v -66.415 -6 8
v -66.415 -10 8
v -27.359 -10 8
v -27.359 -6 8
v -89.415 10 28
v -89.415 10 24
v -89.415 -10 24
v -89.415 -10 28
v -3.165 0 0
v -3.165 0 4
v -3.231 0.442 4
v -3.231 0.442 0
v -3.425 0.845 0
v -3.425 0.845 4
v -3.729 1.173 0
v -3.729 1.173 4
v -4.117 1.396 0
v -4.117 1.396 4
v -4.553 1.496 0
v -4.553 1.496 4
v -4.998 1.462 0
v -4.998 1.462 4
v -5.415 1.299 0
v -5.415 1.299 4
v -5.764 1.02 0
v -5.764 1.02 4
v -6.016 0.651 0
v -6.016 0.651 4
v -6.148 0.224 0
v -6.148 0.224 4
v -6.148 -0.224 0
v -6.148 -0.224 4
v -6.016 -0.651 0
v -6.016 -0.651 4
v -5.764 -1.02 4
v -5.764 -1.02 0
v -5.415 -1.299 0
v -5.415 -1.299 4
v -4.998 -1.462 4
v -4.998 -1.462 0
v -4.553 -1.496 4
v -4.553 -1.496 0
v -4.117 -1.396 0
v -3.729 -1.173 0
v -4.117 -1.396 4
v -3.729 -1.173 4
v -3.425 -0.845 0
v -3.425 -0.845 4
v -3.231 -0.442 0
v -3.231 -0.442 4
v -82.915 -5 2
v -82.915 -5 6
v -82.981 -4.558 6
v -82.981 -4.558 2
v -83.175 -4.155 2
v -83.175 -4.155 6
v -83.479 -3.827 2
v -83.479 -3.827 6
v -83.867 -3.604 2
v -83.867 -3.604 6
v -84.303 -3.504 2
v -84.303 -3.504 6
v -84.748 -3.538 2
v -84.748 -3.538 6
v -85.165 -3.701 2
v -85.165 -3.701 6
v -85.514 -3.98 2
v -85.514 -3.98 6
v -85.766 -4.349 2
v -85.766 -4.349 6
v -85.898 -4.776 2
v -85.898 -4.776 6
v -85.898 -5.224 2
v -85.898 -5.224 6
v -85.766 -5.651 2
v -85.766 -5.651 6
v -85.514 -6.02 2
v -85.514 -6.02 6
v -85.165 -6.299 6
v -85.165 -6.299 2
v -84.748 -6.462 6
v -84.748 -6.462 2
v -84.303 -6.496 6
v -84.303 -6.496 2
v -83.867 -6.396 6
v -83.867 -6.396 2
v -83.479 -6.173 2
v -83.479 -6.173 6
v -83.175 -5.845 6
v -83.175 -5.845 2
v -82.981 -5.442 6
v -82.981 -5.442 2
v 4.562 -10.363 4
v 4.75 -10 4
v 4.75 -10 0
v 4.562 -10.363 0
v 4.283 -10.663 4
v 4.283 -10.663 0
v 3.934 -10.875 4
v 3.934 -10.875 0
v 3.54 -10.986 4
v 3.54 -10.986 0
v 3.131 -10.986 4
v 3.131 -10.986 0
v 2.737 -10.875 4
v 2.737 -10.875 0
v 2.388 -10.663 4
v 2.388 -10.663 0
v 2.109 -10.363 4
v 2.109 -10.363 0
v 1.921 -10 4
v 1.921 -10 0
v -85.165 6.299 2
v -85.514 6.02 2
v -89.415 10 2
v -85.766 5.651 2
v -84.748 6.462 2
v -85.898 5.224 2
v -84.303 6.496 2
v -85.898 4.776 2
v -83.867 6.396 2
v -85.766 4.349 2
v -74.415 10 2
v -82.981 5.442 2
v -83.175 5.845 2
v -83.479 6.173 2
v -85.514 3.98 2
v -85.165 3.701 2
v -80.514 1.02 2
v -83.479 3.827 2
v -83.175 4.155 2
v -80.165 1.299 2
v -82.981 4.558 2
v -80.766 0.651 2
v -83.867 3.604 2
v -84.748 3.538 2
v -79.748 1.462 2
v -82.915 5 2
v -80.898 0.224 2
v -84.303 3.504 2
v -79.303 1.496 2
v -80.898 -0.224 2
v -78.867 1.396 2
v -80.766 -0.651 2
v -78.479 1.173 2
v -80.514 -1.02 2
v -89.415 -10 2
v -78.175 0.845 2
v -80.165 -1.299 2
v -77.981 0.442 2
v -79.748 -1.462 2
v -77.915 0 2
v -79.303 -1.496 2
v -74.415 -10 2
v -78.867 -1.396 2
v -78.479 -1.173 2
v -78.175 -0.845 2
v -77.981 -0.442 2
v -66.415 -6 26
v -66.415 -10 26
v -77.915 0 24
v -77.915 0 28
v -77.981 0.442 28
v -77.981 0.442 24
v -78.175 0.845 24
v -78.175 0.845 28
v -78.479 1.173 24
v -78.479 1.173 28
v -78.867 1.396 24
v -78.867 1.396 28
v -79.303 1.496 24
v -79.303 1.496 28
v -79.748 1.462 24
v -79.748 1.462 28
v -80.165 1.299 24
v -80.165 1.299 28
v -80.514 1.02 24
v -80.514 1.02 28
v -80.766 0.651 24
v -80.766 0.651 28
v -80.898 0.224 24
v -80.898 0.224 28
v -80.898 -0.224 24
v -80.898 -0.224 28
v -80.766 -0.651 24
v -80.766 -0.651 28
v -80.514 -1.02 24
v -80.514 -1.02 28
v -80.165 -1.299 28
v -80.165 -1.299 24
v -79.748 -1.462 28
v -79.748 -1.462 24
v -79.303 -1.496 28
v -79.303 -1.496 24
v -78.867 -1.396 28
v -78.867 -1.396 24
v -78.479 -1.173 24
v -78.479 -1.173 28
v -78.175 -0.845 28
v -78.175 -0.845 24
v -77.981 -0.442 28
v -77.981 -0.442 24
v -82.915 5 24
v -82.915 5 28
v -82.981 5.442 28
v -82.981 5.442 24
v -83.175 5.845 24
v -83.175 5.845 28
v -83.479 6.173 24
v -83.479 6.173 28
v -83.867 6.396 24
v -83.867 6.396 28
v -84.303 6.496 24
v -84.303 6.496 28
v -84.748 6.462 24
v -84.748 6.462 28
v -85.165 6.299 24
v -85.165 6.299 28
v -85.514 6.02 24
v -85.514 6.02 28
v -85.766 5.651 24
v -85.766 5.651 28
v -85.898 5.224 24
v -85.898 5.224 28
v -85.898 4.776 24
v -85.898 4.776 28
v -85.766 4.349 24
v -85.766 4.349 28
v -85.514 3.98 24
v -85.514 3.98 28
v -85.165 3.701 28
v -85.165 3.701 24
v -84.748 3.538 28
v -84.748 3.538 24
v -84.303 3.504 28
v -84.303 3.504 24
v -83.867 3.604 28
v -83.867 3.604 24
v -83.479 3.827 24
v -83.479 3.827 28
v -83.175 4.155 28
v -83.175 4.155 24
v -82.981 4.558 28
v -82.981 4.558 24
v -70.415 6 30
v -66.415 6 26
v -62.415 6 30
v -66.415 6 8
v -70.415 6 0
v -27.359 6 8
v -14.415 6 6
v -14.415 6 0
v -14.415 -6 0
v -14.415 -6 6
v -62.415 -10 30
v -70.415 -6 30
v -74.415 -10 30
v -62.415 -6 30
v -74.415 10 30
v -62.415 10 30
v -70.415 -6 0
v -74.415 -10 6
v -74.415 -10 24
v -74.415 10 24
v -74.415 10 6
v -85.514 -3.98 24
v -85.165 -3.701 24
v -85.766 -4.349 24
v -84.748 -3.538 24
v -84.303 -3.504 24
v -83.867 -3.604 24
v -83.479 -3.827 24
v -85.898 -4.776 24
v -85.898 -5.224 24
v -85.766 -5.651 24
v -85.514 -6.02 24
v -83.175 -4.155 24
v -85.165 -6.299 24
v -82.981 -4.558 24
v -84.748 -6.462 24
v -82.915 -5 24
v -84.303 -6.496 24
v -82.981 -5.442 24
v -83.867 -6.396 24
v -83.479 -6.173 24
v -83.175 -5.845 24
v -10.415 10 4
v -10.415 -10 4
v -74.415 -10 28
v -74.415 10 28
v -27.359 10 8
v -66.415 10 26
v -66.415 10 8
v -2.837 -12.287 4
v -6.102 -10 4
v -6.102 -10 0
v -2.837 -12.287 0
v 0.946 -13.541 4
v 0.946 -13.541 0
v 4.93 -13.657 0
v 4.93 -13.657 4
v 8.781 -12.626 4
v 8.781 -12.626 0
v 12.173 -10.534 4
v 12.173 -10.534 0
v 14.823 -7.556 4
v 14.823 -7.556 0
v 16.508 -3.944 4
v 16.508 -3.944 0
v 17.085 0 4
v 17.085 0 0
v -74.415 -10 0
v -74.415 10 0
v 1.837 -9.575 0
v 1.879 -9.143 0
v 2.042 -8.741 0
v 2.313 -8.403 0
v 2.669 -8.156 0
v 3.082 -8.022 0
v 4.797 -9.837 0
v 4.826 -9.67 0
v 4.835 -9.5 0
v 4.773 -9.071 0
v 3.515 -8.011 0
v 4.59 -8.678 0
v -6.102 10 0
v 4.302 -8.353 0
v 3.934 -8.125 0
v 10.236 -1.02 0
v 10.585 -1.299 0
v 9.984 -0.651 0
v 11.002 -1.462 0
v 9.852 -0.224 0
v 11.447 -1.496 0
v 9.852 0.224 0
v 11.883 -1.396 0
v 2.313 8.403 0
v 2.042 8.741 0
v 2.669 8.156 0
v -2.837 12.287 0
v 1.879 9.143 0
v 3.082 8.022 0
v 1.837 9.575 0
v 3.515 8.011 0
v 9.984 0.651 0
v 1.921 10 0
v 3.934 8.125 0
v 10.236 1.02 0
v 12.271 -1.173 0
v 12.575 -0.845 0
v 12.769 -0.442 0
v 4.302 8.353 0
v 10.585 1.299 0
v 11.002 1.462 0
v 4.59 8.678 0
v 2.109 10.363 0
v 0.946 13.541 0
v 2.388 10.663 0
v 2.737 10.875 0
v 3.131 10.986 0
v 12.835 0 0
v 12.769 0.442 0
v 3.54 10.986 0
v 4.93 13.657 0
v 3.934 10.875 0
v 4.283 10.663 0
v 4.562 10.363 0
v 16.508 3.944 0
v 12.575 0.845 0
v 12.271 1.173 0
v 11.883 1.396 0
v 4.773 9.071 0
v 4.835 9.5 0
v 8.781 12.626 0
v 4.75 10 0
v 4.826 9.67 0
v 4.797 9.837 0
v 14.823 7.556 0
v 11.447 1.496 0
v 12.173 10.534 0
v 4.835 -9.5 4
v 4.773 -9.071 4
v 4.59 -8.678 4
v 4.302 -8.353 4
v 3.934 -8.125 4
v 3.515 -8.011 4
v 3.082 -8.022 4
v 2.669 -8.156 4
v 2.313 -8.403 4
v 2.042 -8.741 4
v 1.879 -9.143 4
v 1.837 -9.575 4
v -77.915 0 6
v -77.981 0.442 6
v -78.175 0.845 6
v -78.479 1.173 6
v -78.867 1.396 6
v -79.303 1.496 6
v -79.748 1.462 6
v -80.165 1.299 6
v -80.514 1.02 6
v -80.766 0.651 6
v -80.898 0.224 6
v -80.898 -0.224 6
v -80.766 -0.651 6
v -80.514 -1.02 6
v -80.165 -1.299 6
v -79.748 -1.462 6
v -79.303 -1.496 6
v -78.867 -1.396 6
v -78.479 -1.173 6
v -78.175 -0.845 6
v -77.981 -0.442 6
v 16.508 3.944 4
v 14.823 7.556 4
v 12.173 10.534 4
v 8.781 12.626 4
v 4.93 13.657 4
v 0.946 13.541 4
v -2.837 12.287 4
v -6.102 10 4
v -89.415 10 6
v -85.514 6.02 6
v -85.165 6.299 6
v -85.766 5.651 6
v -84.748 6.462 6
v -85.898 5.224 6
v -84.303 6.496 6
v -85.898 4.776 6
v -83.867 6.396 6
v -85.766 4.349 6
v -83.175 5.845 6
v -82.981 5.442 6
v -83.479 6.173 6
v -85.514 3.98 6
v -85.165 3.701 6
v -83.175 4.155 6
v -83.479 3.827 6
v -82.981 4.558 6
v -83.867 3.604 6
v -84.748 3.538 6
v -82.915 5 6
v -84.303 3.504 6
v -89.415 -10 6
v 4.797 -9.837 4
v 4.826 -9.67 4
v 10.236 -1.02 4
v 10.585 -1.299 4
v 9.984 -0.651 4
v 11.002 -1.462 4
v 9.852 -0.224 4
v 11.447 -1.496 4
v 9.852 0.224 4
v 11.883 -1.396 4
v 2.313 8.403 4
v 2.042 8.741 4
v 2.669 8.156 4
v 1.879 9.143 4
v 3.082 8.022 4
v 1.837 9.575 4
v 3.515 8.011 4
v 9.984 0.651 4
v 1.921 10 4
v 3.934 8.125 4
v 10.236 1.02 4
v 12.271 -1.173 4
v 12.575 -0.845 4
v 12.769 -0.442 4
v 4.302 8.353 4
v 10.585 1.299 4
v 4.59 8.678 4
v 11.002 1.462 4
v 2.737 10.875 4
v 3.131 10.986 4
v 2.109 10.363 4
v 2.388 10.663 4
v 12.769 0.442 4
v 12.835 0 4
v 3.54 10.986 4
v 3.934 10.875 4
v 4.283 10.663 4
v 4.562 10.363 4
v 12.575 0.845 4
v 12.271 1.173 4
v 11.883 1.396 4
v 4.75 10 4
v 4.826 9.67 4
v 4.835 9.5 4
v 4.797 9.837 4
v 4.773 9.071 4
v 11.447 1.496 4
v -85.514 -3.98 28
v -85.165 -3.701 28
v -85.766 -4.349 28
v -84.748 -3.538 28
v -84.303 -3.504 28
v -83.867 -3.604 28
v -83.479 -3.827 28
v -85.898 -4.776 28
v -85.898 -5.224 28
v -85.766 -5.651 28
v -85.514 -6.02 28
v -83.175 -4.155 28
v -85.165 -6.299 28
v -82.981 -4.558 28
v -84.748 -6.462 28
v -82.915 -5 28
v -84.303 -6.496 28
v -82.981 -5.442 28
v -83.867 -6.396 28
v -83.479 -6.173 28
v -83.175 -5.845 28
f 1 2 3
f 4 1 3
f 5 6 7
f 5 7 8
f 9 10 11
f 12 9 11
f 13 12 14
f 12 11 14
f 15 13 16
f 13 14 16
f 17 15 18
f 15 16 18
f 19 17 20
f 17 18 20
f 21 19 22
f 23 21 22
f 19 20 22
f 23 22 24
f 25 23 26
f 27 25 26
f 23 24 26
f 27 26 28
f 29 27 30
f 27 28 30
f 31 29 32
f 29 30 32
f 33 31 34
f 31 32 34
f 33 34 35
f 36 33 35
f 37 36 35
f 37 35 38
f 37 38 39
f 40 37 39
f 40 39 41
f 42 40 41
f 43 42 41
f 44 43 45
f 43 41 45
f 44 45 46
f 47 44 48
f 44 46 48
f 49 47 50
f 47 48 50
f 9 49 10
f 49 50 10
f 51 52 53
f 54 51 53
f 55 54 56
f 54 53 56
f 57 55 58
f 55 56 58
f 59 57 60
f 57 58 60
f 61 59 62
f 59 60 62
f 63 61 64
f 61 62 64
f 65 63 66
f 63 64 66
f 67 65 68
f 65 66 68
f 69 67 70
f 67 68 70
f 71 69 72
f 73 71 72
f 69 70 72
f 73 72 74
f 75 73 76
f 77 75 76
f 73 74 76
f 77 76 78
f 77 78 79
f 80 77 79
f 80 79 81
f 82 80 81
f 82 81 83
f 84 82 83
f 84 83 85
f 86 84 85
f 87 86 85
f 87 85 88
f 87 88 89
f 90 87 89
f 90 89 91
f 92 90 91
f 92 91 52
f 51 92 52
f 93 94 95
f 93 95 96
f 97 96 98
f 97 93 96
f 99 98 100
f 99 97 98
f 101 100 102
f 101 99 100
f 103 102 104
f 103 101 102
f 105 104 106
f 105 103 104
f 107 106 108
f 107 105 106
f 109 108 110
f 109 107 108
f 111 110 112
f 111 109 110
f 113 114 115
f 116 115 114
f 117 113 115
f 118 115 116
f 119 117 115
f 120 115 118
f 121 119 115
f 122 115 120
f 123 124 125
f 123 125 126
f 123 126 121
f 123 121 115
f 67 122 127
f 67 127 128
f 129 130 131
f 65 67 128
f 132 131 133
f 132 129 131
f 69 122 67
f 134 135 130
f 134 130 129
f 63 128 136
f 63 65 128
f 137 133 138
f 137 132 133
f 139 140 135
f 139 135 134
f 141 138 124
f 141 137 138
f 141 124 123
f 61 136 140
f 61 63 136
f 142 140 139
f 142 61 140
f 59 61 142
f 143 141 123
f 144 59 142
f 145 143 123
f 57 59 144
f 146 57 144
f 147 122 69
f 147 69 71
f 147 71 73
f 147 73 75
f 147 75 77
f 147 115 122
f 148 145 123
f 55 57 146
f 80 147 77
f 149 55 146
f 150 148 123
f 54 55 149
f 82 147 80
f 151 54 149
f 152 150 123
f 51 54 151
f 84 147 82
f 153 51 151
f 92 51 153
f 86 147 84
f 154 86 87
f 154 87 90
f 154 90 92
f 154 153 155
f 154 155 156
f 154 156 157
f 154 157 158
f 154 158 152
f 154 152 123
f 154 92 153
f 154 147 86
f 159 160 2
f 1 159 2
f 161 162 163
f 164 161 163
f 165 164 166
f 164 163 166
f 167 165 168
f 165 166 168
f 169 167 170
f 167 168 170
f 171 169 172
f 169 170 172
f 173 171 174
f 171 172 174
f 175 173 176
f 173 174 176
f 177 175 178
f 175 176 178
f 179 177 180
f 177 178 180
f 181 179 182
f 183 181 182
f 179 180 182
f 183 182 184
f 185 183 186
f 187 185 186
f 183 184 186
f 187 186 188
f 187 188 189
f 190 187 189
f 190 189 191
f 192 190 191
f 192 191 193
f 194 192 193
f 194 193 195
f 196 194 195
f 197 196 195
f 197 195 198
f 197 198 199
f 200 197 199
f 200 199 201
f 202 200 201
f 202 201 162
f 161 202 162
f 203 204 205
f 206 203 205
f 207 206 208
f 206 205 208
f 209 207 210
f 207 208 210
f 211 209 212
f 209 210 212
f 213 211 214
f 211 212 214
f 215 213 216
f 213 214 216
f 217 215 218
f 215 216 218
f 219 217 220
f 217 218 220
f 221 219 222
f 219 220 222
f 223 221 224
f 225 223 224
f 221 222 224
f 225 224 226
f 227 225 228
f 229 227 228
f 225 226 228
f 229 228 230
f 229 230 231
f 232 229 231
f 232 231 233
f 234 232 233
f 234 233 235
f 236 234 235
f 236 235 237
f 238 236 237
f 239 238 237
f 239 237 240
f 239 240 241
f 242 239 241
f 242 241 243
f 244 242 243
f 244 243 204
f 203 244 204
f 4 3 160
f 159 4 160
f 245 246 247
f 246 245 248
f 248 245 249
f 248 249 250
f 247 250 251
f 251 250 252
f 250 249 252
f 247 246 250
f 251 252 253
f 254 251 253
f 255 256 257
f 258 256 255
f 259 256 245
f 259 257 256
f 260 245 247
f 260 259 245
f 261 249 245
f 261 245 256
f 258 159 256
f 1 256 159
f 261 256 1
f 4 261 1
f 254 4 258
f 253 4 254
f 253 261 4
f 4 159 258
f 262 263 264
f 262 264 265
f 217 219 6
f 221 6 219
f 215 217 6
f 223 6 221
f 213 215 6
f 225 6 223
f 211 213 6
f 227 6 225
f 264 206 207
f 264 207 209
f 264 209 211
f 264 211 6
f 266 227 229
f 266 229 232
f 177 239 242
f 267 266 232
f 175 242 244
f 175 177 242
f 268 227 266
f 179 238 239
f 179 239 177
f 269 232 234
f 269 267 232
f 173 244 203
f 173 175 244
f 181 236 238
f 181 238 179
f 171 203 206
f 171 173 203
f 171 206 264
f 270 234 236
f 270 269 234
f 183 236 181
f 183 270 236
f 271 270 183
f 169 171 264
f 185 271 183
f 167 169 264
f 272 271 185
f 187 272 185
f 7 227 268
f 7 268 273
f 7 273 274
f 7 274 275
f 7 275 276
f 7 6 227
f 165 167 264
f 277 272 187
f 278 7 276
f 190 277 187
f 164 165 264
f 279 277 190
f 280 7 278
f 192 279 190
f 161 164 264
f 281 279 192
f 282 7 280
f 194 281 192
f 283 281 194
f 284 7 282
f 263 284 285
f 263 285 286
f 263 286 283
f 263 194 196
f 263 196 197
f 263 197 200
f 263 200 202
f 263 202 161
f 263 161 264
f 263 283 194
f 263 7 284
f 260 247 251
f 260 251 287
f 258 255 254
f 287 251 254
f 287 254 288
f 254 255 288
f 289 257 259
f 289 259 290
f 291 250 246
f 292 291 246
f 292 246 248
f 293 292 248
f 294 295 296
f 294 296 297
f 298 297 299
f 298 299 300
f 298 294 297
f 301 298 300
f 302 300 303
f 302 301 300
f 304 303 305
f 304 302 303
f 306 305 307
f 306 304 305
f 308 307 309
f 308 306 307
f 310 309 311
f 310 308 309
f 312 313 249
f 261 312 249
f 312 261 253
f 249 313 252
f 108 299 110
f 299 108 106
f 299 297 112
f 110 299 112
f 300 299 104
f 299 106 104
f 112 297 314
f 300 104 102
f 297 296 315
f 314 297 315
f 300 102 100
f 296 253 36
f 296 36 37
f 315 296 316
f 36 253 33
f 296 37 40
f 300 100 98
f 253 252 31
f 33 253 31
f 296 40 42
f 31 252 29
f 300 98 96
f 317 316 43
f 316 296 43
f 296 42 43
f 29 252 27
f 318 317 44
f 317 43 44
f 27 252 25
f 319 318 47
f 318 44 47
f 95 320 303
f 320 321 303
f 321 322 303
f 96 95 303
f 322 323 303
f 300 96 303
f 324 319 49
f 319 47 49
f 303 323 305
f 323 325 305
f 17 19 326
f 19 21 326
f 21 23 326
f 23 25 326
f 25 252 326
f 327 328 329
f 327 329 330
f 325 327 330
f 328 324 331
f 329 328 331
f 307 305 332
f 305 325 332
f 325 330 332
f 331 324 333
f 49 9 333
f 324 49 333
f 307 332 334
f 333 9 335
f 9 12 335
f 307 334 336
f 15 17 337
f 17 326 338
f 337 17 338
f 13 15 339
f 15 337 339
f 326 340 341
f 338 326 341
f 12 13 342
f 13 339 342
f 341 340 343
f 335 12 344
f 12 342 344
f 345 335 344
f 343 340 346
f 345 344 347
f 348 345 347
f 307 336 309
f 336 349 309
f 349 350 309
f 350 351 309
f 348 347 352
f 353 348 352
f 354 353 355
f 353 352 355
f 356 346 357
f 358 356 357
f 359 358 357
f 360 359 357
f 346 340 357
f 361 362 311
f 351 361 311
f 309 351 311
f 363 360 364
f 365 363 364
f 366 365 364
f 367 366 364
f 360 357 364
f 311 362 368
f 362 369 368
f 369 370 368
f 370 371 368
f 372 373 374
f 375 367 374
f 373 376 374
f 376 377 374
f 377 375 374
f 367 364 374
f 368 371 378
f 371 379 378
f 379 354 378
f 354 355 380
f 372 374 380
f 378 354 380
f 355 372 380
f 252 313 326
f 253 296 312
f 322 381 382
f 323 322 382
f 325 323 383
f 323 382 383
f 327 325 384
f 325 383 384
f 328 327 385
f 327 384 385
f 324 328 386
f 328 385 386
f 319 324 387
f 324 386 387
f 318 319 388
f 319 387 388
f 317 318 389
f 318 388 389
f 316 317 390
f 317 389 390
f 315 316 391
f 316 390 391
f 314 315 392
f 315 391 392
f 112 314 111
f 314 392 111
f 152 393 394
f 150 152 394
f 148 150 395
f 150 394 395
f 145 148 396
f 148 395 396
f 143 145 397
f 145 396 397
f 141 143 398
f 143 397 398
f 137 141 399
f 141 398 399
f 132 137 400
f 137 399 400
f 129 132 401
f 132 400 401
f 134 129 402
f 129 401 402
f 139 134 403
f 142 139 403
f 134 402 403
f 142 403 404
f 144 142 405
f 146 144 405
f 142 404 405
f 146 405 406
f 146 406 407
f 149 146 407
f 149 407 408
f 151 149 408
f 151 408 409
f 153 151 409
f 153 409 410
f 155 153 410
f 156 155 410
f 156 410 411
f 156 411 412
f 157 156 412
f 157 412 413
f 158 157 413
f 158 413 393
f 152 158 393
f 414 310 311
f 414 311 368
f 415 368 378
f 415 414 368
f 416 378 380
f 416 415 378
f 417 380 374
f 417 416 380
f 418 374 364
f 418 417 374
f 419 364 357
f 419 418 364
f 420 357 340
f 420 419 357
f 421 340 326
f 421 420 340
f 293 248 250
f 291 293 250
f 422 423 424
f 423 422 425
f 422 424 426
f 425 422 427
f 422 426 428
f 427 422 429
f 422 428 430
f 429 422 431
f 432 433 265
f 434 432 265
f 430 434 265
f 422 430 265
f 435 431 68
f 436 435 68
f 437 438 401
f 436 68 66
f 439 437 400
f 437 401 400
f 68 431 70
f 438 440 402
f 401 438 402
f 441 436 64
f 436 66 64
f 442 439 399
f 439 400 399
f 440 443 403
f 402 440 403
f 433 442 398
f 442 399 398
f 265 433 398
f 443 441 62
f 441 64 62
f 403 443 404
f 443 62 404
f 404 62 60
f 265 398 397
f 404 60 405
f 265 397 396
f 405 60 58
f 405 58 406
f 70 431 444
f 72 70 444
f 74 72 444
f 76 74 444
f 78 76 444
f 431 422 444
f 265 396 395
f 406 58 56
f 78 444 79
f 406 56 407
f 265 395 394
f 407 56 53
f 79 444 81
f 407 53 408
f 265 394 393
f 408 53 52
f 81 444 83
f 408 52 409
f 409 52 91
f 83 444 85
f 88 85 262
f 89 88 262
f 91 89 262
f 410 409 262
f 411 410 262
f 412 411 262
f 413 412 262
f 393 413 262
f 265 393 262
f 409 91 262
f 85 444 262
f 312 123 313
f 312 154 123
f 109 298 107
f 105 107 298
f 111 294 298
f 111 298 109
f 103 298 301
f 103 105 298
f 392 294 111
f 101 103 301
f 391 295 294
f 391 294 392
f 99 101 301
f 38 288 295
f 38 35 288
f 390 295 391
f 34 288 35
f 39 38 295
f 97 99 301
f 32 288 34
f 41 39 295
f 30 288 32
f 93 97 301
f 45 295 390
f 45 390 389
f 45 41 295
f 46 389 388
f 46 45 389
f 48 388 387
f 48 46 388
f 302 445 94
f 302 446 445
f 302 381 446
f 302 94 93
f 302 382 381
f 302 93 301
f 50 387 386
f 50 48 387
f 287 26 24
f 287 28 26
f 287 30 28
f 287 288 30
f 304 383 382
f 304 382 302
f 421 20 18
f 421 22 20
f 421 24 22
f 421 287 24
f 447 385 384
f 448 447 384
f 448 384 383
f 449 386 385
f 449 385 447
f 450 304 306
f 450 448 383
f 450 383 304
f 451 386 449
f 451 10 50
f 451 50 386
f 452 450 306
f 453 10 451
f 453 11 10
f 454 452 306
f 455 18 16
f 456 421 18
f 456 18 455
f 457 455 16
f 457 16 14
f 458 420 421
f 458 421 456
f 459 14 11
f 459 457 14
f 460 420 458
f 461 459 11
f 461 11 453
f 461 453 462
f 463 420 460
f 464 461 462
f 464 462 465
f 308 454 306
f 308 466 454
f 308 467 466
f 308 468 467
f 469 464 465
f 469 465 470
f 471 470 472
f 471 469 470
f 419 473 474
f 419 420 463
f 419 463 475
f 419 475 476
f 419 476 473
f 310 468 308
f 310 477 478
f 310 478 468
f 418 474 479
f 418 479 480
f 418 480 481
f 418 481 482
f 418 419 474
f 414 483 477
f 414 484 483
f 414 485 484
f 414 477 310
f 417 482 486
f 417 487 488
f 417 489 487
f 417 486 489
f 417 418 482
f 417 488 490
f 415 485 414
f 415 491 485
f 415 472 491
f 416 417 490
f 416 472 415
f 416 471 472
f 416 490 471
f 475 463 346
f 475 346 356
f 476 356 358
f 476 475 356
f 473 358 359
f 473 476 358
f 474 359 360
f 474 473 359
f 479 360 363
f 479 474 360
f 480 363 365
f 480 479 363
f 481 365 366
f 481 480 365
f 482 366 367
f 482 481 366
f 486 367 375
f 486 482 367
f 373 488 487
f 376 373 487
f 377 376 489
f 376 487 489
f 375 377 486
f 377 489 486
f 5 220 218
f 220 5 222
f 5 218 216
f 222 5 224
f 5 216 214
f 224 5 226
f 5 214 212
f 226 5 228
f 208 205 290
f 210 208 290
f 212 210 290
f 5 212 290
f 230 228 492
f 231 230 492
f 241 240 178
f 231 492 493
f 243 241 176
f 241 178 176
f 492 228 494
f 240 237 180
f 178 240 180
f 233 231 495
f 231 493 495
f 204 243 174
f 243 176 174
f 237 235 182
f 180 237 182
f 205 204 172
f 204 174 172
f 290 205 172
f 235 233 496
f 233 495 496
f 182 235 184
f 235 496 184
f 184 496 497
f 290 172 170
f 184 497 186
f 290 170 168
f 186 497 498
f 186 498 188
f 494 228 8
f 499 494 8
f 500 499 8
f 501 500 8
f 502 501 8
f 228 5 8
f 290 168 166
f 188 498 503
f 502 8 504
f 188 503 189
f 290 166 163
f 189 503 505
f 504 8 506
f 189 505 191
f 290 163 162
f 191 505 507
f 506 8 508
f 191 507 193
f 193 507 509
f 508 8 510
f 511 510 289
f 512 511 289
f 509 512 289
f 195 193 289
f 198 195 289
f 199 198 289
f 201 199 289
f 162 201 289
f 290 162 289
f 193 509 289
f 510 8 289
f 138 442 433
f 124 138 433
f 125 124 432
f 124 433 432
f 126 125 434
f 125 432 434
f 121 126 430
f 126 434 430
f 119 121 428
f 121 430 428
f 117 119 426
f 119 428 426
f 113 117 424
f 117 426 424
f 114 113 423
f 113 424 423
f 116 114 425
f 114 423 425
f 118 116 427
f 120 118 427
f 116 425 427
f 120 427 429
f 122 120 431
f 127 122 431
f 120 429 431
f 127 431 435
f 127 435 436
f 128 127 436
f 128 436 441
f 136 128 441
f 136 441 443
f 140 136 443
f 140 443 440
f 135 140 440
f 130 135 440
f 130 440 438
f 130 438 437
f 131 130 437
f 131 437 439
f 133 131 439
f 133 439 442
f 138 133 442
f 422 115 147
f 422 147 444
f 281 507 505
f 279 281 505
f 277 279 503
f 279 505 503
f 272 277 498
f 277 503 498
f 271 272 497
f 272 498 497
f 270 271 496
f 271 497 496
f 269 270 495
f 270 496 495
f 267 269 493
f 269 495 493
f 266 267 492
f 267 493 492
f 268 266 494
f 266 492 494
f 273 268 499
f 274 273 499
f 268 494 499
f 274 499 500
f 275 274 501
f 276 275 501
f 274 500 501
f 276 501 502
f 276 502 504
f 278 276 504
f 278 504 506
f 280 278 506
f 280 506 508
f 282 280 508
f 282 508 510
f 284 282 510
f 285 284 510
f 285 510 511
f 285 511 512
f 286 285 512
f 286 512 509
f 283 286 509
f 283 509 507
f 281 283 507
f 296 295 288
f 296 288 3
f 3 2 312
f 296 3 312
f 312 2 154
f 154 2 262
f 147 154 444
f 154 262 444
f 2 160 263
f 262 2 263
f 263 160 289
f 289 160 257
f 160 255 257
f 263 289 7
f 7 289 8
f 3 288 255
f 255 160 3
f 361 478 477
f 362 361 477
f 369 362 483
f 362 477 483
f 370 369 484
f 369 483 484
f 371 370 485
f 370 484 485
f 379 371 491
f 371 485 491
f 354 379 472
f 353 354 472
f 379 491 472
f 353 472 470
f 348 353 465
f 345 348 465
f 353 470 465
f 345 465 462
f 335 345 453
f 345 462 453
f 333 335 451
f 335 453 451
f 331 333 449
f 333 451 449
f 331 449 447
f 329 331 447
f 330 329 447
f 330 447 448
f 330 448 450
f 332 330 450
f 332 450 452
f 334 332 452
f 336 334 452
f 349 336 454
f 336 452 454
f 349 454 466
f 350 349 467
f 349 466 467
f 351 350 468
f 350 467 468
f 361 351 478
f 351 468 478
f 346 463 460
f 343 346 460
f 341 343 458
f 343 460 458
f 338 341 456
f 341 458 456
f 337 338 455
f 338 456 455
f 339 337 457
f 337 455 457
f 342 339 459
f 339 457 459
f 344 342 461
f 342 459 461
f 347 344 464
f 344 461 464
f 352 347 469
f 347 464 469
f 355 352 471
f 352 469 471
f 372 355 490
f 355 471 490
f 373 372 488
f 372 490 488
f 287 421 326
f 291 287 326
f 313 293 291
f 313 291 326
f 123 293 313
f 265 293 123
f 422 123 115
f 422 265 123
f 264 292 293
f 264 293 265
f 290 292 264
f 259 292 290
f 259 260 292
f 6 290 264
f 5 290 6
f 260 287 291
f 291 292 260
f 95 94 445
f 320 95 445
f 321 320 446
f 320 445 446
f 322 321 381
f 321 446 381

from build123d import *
from build123d import SkipClean  # not in build123d's __all__

# Parameters (mm, degrees)
F0_W        = 15
F0_H        = 4
F1_DEPTH    = 10
F2_T4_DEPTH = 20
F3_R        = 1.5
F4_DEPTH    = 4
F5_DEPTH    = 4
F7_DEPTH    = 20
F8_W        = 56
F8_H        = 12
F9_DEPTH    = 30
F10_R       = 1.5
F11_DEPTH   = 26


# Not quite as in the source:
# - a fillet or chamfer that OpenCascade refuses, or shapes differently, is made with other operations: its cross-section is extruded or revolved along the edge and cut away or added


with BuildPart() as f1:
    # F0 (on Front) → F1 (new body, symmetric)
    with BuildSketch(Plane.XZ):
        Polygon((-74.4146332145, 2), (-74.4146332145, 0), (5.5853667855, 0), (5.5853667855, 4), (-70.4146332145, 4), (-70.4146332145, 30), (-74.4146332145, 30), (-74.4146332145, 28), (-74.4146332145, 24), (-74.4146332145, 6), align=None)
        with Locations((-81.9146332145, 26)):
            Rectangle(F0_W, F0_H)
        with Locations((-81.9146332145, 4)):
            Rectangle(F0_W, F0_H)
    extrude(amount=F1_DEPTH, both=True)

    # F2: chamfer of 30 x 60 on 1 edges, made by hand


with BuildPart() as f2_tool2:
    # F2_s3 → F2_t4 (new body)
    with BuildSketch(Plane.XZ.offset(10)):
        Polygon((-70.4146332145, 34), (-10.4146332145, 4), (-70.4146332145, 4), align=None)
    extrude(amount=-F2_T4_DEPTH)

    split(bisect_by=Plane.XY.offset(30), keep=Keep.BOTTOM)


with BuildPart() as f1_1:
    add(f1.part, clean=False)

    # F2_t1: union F2_tool2
    add(f2_tool2.part)

    # F3 (on face) → F4 (join)
    with BuildSketch(Plane.XY.offset(4)):
        with BuildLine():
            ThreePointArc((-6.1019262586, -10), (8.7805353157, -12.6258718383), (17.0853667855, 0))
            ThreePointArc((17.0853667855, 0), (8.7805353157, 12.6258718383), (-6.1019262586, 10))
            Line((-6.1019262586, 10), (1.9211532232, 10))
            ThreePointArc((1.9211532232, 10), (3.3353667855, 11), (4.7495803479, 10))
            Line((4.7495803479, 10), (5.5853667855, 10))
            Line((5.5853667855, 10), (5.5853667855, -10))
            Line((5.5853667855, -10), (4.7495803479, -10))
            ThreePointArc((4.7495803479, -10), (3.3353667855, -11), (1.9211532232, -10))
            Line((1.9211532232, -10), (-6.1019262586, -10))
        make_face()
        with Locations((11.3353667855, 0)):
            Circle(F3_R, mode=Mode.SUBTRACT)
    extrude(amount=-F4_DEPTH)

    # F3 (on face) → F5 (cut)
    with BuildSketch(Plane.XY.offset(4)):
        with Locations((-4.6646332145, 0)):
            Circle(F3_R)
        with BuildLine():
            ThreePointArc((4.8353667855, -9.5), (3.0817138174, -8.0216021605), (1.9211532232, -10))
            Line((1.9211532232, -10), (4.7495803479, -10))
            ThreePointArc((4.7495803479, -10), (4.813764625, -9.7536529681), (4.8353667855, -9.5))
        make_face()
        with BuildLine():
            Line((4.7495803479, 10), (1.9211532232, 10))
            ThreePointArc((1.9211532232, 10), (3.0817138174, 8.0216021605), (4.8353667855, 9.5))
            ThreePointArc((4.8353667855, 9.5), (4.813764625, 9.7536529681), (4.7495803479, 10))
        make_face()
    with SkipClean():  # cleaning this boolean's faces spoils the solid; the shape is the same uncleaned
        extrude(amount=-F5_DEPTH, mode=Mode.SUBTRACT)

    # F6 (on face) → F7 (cut)
    with BuildSketch(Plane.XZ.offset(10)):
        Polygon((-27.3589051245, 8), (-66.4146332145, 26), (-66.4146332145, 8), align=None)
    extrude(amount=-F7_DEPTH, mode=Mode.SUBTRACT)

    # F8 (on face) → F9 (cut)
    with BuildSketch(Plane(origin=(0, 0, 0), x_dir=(1, 0, 0), z_dir=(0, 0, -1))):
        with Locations((-42.4146332145, 0)):
            Rectangle(F8_W, F8_H)
    extrude(amount=-F9_DEPTH, mode=Mode.SUBTRACT)

    # F10 (on face) → F11 (cut)
    with BuildSketch(Plane.XY.offset(28)):
        with Locations((-84.4146332145, 5)):
            Circle(F10_R)
        with Locations((-84.4146332145, -5)):
            Circle(F10_R)
        with Locations((-79.4146332145, 0)):
            Circle(F10_R)
    extrude(amount=-F11_DEPTH, mode=Mode.SUBTRACT)


solid = f1_1.part
